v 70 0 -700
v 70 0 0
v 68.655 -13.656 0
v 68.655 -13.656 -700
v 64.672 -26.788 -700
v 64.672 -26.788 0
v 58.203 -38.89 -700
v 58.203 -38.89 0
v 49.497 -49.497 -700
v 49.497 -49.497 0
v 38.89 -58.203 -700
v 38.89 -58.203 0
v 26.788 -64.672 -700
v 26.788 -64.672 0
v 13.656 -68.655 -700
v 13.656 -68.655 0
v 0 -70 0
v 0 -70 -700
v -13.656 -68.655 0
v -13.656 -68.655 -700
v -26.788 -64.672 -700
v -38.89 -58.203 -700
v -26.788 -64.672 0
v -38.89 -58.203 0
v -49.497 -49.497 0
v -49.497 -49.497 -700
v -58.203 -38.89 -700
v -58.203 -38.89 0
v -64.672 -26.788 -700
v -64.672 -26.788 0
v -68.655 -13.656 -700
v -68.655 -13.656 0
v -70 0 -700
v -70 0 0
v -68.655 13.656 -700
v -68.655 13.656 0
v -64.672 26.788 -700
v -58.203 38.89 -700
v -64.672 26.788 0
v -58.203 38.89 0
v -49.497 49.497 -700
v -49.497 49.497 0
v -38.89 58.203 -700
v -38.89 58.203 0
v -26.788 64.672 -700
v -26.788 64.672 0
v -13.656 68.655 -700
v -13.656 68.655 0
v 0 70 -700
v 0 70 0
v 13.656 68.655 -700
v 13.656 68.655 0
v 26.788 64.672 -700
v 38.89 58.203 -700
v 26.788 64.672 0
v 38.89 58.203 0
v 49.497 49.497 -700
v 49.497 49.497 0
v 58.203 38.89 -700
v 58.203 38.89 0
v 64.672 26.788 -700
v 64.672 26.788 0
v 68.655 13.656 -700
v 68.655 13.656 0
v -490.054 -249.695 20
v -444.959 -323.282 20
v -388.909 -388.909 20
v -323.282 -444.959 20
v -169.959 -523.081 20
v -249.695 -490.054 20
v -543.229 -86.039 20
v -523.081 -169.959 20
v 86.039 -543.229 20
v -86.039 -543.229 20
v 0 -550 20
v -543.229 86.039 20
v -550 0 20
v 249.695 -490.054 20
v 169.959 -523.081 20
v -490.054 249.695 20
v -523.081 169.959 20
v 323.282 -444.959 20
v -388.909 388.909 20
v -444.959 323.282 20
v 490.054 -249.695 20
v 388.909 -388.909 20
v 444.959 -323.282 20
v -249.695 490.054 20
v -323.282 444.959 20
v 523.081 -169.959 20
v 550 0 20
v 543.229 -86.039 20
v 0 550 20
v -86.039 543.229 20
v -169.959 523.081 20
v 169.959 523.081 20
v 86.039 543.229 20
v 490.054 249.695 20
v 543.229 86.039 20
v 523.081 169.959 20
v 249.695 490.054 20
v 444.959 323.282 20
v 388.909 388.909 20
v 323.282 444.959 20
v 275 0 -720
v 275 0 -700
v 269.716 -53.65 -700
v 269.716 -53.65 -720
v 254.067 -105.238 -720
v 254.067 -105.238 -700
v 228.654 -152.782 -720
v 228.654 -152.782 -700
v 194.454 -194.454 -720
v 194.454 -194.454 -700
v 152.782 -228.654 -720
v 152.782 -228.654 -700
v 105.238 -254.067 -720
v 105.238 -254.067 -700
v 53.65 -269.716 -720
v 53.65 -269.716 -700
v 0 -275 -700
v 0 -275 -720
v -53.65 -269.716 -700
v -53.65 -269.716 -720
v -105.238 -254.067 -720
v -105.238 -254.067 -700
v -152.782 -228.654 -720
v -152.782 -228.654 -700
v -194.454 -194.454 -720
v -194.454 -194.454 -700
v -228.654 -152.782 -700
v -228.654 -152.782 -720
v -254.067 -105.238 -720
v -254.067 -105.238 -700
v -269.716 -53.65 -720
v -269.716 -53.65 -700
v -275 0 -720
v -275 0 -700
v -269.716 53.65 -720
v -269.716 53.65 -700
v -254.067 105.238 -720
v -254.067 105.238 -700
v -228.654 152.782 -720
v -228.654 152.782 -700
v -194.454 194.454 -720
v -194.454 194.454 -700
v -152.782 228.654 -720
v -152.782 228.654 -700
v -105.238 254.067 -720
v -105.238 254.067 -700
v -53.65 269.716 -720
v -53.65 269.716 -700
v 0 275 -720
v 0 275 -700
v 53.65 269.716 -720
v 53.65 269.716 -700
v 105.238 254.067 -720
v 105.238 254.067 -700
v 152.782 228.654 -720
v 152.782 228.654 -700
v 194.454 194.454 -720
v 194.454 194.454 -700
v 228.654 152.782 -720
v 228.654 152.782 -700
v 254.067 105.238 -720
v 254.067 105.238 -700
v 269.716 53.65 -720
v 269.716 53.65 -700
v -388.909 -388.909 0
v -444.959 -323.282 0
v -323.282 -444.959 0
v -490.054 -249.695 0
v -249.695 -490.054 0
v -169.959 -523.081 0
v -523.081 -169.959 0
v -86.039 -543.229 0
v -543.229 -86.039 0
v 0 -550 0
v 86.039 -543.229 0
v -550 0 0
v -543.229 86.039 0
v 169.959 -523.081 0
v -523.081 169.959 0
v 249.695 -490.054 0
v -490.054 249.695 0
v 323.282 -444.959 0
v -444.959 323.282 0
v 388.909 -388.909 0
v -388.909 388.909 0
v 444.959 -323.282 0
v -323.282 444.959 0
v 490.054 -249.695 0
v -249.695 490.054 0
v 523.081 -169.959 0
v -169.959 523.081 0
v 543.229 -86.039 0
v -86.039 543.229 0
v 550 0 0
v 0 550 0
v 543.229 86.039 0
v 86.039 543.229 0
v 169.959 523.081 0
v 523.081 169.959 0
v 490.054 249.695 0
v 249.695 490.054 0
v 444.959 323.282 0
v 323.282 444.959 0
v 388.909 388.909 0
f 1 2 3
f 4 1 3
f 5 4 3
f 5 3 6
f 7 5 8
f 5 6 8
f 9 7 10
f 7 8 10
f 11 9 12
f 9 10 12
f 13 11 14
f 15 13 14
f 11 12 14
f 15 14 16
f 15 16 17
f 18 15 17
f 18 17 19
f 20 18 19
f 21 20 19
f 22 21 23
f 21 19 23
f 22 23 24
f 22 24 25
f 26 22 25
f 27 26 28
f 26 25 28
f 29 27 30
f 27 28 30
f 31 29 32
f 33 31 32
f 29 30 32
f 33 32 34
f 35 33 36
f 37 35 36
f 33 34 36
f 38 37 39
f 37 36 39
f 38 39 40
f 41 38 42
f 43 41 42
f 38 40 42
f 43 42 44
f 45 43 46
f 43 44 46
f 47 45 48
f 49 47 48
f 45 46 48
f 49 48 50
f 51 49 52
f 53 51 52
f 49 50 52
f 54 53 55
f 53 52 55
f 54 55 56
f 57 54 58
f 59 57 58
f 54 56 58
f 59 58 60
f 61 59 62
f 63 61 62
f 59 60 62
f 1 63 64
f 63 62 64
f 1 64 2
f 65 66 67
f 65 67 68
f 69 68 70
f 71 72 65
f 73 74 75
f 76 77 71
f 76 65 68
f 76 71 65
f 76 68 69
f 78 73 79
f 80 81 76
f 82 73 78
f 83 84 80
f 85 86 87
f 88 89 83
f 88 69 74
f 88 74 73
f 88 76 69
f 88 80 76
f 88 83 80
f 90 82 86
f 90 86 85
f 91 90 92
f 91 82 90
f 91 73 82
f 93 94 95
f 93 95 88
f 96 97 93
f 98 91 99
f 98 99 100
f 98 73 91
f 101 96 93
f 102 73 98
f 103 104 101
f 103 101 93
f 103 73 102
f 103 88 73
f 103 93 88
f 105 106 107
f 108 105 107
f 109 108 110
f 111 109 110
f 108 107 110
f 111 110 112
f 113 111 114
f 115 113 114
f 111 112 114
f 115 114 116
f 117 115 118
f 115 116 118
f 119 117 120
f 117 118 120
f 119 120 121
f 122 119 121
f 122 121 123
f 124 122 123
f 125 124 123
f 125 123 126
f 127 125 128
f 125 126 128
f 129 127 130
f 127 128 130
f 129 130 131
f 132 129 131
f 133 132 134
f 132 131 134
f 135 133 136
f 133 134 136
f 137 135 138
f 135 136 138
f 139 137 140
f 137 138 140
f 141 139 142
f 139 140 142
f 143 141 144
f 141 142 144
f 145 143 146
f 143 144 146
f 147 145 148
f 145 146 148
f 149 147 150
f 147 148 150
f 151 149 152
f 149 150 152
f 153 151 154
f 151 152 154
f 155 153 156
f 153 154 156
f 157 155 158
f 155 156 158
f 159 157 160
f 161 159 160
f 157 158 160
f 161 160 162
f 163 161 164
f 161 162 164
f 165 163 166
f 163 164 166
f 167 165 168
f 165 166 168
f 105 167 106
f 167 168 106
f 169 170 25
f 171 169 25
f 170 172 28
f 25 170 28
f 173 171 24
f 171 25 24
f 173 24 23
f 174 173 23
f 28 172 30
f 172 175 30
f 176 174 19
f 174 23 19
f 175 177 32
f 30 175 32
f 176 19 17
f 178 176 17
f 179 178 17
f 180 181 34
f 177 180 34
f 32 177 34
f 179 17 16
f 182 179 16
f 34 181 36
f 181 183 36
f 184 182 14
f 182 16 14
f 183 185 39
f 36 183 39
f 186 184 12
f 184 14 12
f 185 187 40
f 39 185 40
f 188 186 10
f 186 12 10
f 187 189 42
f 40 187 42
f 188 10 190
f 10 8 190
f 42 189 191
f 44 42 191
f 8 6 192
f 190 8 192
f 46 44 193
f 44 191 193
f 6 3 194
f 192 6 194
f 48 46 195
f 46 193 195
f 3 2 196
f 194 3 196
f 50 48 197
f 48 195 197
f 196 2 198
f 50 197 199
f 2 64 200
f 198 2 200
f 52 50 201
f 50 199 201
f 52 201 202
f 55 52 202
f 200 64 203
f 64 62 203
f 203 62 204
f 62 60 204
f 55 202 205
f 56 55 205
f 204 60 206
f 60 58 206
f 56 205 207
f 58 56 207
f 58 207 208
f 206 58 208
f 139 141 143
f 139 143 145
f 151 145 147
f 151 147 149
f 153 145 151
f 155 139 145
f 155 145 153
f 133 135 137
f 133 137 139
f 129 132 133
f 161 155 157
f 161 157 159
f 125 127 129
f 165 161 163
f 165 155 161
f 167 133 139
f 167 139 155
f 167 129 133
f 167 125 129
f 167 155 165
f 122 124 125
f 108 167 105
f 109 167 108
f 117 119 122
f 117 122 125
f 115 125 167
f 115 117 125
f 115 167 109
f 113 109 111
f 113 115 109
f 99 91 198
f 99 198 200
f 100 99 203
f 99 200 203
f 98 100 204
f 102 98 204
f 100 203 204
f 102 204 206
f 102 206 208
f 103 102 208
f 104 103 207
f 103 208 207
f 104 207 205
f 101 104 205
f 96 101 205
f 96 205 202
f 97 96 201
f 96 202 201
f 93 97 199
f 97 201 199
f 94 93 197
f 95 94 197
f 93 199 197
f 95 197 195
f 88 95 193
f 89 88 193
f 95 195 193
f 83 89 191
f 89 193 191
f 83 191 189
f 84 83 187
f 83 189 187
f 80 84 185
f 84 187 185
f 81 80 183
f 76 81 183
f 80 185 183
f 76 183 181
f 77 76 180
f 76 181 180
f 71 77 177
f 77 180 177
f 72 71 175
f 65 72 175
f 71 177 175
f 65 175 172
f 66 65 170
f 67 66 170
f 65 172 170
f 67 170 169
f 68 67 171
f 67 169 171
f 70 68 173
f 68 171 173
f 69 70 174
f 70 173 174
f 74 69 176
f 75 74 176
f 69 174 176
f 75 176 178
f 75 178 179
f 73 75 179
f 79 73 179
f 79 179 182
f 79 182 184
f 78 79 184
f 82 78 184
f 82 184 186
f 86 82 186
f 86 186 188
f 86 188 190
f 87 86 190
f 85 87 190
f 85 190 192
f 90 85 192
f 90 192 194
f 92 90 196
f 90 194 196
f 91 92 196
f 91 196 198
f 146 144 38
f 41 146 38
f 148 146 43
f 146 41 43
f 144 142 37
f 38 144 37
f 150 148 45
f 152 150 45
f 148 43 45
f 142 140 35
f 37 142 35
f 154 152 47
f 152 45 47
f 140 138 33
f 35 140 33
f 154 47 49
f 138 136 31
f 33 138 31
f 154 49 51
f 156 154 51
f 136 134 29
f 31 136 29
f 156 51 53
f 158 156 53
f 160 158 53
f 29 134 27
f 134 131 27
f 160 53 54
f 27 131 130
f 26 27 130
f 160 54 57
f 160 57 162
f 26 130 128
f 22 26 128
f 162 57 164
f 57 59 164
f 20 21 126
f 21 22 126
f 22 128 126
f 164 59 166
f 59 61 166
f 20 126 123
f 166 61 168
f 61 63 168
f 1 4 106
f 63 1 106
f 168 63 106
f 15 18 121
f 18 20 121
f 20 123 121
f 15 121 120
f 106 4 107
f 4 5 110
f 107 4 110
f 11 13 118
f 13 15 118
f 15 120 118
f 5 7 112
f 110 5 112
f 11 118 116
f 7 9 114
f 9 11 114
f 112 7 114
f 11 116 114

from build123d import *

# Parameters (mm, degrees)
F0_R     = 550
F1_DEPTH = 20
F2_R     = 70
F3_DEPTH = 700
F4_R     = 275
F5_DEPTH = 20


with BuildPart() as f1:
    # F0 (on Top) → F1 (new body)
    with BuildSketch(Plane.XY):
        Circle(F0_R)
    extrude(amount=F1_DEPTH)

    # F2 (on face) → F3 (join)
    with BuildSketch(Plane(origin=(0, 0, 0), x_dir=(1, 0, 0), z_dir=(0, 0, -1))):
        Circle(F2_R)
    extrude(amount=F3_DEPTH)

    # F4 (on face) → F5 (join)
    with BuildSketch(Plane(origin=(0, 0, -700), x_dir=(1, 0, 0), z_dir=(0, 0, -1))):
        Circle(F4_R)
    extrude(amount=F5_DEPTH)


solid = f1.part
